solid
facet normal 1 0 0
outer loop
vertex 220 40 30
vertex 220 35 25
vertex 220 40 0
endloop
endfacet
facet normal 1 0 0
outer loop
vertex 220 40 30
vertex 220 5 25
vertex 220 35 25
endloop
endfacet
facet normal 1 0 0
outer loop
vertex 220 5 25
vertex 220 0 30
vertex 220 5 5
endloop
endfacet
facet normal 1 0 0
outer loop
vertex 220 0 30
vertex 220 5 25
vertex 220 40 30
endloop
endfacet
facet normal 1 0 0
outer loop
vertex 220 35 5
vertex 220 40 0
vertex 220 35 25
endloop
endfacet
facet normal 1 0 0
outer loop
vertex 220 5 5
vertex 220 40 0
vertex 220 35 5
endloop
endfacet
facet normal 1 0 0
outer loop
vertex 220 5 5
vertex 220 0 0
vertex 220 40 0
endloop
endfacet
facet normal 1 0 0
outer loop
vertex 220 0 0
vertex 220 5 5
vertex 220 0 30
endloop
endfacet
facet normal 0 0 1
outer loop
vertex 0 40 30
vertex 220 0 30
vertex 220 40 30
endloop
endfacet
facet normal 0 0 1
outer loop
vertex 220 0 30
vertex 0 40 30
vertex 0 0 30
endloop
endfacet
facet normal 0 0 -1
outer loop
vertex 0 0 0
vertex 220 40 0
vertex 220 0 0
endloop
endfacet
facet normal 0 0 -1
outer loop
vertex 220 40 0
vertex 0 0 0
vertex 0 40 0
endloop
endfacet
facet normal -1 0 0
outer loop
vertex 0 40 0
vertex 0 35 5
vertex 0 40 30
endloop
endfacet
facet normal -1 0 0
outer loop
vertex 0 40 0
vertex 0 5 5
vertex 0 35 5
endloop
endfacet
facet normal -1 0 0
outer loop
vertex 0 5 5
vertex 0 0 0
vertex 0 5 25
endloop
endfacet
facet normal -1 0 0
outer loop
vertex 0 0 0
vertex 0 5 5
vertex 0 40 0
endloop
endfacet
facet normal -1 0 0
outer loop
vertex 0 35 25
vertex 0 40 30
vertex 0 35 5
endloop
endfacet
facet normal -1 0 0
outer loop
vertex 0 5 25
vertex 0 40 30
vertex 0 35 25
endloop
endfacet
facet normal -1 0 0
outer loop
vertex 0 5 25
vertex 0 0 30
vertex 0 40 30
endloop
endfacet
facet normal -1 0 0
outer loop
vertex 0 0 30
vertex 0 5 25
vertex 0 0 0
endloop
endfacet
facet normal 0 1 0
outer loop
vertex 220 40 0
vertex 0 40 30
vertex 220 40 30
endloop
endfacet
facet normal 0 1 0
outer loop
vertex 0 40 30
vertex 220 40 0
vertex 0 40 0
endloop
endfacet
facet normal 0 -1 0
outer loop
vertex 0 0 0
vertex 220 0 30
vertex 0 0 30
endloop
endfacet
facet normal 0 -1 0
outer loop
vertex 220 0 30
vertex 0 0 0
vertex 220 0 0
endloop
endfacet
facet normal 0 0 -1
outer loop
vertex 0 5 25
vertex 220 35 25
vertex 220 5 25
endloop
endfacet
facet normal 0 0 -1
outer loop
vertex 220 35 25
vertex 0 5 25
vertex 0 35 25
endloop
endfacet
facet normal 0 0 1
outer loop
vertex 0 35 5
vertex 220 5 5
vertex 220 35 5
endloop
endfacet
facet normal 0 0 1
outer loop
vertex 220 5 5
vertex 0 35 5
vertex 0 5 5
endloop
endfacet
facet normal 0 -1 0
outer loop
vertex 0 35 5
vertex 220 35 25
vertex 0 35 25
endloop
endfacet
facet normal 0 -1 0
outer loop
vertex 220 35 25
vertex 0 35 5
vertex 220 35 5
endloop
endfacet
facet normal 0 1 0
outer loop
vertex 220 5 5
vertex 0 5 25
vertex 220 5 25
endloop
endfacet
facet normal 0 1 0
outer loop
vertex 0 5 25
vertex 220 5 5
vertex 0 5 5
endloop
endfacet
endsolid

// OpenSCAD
$fn = 32;

// ----------------------------------------------------------------------
// Box beam: 200-250 mm hollow beam
// ----------------------------------------------------------------------

// --- parameters (mm) ---
beam_l = 220;             // beam length, X
beam_w = 40;              // beam width, Y
beam_h = 30;              // beam height, Z
wall = 5;                 // wall thickness

difference() {
  cube([beam_l, beam_w, beam_h]);
  translate([-1, wall, wall])
    cube([beam_l + 2, beam_w - 2 * wall, beam_h - 2 * wall]);
}
